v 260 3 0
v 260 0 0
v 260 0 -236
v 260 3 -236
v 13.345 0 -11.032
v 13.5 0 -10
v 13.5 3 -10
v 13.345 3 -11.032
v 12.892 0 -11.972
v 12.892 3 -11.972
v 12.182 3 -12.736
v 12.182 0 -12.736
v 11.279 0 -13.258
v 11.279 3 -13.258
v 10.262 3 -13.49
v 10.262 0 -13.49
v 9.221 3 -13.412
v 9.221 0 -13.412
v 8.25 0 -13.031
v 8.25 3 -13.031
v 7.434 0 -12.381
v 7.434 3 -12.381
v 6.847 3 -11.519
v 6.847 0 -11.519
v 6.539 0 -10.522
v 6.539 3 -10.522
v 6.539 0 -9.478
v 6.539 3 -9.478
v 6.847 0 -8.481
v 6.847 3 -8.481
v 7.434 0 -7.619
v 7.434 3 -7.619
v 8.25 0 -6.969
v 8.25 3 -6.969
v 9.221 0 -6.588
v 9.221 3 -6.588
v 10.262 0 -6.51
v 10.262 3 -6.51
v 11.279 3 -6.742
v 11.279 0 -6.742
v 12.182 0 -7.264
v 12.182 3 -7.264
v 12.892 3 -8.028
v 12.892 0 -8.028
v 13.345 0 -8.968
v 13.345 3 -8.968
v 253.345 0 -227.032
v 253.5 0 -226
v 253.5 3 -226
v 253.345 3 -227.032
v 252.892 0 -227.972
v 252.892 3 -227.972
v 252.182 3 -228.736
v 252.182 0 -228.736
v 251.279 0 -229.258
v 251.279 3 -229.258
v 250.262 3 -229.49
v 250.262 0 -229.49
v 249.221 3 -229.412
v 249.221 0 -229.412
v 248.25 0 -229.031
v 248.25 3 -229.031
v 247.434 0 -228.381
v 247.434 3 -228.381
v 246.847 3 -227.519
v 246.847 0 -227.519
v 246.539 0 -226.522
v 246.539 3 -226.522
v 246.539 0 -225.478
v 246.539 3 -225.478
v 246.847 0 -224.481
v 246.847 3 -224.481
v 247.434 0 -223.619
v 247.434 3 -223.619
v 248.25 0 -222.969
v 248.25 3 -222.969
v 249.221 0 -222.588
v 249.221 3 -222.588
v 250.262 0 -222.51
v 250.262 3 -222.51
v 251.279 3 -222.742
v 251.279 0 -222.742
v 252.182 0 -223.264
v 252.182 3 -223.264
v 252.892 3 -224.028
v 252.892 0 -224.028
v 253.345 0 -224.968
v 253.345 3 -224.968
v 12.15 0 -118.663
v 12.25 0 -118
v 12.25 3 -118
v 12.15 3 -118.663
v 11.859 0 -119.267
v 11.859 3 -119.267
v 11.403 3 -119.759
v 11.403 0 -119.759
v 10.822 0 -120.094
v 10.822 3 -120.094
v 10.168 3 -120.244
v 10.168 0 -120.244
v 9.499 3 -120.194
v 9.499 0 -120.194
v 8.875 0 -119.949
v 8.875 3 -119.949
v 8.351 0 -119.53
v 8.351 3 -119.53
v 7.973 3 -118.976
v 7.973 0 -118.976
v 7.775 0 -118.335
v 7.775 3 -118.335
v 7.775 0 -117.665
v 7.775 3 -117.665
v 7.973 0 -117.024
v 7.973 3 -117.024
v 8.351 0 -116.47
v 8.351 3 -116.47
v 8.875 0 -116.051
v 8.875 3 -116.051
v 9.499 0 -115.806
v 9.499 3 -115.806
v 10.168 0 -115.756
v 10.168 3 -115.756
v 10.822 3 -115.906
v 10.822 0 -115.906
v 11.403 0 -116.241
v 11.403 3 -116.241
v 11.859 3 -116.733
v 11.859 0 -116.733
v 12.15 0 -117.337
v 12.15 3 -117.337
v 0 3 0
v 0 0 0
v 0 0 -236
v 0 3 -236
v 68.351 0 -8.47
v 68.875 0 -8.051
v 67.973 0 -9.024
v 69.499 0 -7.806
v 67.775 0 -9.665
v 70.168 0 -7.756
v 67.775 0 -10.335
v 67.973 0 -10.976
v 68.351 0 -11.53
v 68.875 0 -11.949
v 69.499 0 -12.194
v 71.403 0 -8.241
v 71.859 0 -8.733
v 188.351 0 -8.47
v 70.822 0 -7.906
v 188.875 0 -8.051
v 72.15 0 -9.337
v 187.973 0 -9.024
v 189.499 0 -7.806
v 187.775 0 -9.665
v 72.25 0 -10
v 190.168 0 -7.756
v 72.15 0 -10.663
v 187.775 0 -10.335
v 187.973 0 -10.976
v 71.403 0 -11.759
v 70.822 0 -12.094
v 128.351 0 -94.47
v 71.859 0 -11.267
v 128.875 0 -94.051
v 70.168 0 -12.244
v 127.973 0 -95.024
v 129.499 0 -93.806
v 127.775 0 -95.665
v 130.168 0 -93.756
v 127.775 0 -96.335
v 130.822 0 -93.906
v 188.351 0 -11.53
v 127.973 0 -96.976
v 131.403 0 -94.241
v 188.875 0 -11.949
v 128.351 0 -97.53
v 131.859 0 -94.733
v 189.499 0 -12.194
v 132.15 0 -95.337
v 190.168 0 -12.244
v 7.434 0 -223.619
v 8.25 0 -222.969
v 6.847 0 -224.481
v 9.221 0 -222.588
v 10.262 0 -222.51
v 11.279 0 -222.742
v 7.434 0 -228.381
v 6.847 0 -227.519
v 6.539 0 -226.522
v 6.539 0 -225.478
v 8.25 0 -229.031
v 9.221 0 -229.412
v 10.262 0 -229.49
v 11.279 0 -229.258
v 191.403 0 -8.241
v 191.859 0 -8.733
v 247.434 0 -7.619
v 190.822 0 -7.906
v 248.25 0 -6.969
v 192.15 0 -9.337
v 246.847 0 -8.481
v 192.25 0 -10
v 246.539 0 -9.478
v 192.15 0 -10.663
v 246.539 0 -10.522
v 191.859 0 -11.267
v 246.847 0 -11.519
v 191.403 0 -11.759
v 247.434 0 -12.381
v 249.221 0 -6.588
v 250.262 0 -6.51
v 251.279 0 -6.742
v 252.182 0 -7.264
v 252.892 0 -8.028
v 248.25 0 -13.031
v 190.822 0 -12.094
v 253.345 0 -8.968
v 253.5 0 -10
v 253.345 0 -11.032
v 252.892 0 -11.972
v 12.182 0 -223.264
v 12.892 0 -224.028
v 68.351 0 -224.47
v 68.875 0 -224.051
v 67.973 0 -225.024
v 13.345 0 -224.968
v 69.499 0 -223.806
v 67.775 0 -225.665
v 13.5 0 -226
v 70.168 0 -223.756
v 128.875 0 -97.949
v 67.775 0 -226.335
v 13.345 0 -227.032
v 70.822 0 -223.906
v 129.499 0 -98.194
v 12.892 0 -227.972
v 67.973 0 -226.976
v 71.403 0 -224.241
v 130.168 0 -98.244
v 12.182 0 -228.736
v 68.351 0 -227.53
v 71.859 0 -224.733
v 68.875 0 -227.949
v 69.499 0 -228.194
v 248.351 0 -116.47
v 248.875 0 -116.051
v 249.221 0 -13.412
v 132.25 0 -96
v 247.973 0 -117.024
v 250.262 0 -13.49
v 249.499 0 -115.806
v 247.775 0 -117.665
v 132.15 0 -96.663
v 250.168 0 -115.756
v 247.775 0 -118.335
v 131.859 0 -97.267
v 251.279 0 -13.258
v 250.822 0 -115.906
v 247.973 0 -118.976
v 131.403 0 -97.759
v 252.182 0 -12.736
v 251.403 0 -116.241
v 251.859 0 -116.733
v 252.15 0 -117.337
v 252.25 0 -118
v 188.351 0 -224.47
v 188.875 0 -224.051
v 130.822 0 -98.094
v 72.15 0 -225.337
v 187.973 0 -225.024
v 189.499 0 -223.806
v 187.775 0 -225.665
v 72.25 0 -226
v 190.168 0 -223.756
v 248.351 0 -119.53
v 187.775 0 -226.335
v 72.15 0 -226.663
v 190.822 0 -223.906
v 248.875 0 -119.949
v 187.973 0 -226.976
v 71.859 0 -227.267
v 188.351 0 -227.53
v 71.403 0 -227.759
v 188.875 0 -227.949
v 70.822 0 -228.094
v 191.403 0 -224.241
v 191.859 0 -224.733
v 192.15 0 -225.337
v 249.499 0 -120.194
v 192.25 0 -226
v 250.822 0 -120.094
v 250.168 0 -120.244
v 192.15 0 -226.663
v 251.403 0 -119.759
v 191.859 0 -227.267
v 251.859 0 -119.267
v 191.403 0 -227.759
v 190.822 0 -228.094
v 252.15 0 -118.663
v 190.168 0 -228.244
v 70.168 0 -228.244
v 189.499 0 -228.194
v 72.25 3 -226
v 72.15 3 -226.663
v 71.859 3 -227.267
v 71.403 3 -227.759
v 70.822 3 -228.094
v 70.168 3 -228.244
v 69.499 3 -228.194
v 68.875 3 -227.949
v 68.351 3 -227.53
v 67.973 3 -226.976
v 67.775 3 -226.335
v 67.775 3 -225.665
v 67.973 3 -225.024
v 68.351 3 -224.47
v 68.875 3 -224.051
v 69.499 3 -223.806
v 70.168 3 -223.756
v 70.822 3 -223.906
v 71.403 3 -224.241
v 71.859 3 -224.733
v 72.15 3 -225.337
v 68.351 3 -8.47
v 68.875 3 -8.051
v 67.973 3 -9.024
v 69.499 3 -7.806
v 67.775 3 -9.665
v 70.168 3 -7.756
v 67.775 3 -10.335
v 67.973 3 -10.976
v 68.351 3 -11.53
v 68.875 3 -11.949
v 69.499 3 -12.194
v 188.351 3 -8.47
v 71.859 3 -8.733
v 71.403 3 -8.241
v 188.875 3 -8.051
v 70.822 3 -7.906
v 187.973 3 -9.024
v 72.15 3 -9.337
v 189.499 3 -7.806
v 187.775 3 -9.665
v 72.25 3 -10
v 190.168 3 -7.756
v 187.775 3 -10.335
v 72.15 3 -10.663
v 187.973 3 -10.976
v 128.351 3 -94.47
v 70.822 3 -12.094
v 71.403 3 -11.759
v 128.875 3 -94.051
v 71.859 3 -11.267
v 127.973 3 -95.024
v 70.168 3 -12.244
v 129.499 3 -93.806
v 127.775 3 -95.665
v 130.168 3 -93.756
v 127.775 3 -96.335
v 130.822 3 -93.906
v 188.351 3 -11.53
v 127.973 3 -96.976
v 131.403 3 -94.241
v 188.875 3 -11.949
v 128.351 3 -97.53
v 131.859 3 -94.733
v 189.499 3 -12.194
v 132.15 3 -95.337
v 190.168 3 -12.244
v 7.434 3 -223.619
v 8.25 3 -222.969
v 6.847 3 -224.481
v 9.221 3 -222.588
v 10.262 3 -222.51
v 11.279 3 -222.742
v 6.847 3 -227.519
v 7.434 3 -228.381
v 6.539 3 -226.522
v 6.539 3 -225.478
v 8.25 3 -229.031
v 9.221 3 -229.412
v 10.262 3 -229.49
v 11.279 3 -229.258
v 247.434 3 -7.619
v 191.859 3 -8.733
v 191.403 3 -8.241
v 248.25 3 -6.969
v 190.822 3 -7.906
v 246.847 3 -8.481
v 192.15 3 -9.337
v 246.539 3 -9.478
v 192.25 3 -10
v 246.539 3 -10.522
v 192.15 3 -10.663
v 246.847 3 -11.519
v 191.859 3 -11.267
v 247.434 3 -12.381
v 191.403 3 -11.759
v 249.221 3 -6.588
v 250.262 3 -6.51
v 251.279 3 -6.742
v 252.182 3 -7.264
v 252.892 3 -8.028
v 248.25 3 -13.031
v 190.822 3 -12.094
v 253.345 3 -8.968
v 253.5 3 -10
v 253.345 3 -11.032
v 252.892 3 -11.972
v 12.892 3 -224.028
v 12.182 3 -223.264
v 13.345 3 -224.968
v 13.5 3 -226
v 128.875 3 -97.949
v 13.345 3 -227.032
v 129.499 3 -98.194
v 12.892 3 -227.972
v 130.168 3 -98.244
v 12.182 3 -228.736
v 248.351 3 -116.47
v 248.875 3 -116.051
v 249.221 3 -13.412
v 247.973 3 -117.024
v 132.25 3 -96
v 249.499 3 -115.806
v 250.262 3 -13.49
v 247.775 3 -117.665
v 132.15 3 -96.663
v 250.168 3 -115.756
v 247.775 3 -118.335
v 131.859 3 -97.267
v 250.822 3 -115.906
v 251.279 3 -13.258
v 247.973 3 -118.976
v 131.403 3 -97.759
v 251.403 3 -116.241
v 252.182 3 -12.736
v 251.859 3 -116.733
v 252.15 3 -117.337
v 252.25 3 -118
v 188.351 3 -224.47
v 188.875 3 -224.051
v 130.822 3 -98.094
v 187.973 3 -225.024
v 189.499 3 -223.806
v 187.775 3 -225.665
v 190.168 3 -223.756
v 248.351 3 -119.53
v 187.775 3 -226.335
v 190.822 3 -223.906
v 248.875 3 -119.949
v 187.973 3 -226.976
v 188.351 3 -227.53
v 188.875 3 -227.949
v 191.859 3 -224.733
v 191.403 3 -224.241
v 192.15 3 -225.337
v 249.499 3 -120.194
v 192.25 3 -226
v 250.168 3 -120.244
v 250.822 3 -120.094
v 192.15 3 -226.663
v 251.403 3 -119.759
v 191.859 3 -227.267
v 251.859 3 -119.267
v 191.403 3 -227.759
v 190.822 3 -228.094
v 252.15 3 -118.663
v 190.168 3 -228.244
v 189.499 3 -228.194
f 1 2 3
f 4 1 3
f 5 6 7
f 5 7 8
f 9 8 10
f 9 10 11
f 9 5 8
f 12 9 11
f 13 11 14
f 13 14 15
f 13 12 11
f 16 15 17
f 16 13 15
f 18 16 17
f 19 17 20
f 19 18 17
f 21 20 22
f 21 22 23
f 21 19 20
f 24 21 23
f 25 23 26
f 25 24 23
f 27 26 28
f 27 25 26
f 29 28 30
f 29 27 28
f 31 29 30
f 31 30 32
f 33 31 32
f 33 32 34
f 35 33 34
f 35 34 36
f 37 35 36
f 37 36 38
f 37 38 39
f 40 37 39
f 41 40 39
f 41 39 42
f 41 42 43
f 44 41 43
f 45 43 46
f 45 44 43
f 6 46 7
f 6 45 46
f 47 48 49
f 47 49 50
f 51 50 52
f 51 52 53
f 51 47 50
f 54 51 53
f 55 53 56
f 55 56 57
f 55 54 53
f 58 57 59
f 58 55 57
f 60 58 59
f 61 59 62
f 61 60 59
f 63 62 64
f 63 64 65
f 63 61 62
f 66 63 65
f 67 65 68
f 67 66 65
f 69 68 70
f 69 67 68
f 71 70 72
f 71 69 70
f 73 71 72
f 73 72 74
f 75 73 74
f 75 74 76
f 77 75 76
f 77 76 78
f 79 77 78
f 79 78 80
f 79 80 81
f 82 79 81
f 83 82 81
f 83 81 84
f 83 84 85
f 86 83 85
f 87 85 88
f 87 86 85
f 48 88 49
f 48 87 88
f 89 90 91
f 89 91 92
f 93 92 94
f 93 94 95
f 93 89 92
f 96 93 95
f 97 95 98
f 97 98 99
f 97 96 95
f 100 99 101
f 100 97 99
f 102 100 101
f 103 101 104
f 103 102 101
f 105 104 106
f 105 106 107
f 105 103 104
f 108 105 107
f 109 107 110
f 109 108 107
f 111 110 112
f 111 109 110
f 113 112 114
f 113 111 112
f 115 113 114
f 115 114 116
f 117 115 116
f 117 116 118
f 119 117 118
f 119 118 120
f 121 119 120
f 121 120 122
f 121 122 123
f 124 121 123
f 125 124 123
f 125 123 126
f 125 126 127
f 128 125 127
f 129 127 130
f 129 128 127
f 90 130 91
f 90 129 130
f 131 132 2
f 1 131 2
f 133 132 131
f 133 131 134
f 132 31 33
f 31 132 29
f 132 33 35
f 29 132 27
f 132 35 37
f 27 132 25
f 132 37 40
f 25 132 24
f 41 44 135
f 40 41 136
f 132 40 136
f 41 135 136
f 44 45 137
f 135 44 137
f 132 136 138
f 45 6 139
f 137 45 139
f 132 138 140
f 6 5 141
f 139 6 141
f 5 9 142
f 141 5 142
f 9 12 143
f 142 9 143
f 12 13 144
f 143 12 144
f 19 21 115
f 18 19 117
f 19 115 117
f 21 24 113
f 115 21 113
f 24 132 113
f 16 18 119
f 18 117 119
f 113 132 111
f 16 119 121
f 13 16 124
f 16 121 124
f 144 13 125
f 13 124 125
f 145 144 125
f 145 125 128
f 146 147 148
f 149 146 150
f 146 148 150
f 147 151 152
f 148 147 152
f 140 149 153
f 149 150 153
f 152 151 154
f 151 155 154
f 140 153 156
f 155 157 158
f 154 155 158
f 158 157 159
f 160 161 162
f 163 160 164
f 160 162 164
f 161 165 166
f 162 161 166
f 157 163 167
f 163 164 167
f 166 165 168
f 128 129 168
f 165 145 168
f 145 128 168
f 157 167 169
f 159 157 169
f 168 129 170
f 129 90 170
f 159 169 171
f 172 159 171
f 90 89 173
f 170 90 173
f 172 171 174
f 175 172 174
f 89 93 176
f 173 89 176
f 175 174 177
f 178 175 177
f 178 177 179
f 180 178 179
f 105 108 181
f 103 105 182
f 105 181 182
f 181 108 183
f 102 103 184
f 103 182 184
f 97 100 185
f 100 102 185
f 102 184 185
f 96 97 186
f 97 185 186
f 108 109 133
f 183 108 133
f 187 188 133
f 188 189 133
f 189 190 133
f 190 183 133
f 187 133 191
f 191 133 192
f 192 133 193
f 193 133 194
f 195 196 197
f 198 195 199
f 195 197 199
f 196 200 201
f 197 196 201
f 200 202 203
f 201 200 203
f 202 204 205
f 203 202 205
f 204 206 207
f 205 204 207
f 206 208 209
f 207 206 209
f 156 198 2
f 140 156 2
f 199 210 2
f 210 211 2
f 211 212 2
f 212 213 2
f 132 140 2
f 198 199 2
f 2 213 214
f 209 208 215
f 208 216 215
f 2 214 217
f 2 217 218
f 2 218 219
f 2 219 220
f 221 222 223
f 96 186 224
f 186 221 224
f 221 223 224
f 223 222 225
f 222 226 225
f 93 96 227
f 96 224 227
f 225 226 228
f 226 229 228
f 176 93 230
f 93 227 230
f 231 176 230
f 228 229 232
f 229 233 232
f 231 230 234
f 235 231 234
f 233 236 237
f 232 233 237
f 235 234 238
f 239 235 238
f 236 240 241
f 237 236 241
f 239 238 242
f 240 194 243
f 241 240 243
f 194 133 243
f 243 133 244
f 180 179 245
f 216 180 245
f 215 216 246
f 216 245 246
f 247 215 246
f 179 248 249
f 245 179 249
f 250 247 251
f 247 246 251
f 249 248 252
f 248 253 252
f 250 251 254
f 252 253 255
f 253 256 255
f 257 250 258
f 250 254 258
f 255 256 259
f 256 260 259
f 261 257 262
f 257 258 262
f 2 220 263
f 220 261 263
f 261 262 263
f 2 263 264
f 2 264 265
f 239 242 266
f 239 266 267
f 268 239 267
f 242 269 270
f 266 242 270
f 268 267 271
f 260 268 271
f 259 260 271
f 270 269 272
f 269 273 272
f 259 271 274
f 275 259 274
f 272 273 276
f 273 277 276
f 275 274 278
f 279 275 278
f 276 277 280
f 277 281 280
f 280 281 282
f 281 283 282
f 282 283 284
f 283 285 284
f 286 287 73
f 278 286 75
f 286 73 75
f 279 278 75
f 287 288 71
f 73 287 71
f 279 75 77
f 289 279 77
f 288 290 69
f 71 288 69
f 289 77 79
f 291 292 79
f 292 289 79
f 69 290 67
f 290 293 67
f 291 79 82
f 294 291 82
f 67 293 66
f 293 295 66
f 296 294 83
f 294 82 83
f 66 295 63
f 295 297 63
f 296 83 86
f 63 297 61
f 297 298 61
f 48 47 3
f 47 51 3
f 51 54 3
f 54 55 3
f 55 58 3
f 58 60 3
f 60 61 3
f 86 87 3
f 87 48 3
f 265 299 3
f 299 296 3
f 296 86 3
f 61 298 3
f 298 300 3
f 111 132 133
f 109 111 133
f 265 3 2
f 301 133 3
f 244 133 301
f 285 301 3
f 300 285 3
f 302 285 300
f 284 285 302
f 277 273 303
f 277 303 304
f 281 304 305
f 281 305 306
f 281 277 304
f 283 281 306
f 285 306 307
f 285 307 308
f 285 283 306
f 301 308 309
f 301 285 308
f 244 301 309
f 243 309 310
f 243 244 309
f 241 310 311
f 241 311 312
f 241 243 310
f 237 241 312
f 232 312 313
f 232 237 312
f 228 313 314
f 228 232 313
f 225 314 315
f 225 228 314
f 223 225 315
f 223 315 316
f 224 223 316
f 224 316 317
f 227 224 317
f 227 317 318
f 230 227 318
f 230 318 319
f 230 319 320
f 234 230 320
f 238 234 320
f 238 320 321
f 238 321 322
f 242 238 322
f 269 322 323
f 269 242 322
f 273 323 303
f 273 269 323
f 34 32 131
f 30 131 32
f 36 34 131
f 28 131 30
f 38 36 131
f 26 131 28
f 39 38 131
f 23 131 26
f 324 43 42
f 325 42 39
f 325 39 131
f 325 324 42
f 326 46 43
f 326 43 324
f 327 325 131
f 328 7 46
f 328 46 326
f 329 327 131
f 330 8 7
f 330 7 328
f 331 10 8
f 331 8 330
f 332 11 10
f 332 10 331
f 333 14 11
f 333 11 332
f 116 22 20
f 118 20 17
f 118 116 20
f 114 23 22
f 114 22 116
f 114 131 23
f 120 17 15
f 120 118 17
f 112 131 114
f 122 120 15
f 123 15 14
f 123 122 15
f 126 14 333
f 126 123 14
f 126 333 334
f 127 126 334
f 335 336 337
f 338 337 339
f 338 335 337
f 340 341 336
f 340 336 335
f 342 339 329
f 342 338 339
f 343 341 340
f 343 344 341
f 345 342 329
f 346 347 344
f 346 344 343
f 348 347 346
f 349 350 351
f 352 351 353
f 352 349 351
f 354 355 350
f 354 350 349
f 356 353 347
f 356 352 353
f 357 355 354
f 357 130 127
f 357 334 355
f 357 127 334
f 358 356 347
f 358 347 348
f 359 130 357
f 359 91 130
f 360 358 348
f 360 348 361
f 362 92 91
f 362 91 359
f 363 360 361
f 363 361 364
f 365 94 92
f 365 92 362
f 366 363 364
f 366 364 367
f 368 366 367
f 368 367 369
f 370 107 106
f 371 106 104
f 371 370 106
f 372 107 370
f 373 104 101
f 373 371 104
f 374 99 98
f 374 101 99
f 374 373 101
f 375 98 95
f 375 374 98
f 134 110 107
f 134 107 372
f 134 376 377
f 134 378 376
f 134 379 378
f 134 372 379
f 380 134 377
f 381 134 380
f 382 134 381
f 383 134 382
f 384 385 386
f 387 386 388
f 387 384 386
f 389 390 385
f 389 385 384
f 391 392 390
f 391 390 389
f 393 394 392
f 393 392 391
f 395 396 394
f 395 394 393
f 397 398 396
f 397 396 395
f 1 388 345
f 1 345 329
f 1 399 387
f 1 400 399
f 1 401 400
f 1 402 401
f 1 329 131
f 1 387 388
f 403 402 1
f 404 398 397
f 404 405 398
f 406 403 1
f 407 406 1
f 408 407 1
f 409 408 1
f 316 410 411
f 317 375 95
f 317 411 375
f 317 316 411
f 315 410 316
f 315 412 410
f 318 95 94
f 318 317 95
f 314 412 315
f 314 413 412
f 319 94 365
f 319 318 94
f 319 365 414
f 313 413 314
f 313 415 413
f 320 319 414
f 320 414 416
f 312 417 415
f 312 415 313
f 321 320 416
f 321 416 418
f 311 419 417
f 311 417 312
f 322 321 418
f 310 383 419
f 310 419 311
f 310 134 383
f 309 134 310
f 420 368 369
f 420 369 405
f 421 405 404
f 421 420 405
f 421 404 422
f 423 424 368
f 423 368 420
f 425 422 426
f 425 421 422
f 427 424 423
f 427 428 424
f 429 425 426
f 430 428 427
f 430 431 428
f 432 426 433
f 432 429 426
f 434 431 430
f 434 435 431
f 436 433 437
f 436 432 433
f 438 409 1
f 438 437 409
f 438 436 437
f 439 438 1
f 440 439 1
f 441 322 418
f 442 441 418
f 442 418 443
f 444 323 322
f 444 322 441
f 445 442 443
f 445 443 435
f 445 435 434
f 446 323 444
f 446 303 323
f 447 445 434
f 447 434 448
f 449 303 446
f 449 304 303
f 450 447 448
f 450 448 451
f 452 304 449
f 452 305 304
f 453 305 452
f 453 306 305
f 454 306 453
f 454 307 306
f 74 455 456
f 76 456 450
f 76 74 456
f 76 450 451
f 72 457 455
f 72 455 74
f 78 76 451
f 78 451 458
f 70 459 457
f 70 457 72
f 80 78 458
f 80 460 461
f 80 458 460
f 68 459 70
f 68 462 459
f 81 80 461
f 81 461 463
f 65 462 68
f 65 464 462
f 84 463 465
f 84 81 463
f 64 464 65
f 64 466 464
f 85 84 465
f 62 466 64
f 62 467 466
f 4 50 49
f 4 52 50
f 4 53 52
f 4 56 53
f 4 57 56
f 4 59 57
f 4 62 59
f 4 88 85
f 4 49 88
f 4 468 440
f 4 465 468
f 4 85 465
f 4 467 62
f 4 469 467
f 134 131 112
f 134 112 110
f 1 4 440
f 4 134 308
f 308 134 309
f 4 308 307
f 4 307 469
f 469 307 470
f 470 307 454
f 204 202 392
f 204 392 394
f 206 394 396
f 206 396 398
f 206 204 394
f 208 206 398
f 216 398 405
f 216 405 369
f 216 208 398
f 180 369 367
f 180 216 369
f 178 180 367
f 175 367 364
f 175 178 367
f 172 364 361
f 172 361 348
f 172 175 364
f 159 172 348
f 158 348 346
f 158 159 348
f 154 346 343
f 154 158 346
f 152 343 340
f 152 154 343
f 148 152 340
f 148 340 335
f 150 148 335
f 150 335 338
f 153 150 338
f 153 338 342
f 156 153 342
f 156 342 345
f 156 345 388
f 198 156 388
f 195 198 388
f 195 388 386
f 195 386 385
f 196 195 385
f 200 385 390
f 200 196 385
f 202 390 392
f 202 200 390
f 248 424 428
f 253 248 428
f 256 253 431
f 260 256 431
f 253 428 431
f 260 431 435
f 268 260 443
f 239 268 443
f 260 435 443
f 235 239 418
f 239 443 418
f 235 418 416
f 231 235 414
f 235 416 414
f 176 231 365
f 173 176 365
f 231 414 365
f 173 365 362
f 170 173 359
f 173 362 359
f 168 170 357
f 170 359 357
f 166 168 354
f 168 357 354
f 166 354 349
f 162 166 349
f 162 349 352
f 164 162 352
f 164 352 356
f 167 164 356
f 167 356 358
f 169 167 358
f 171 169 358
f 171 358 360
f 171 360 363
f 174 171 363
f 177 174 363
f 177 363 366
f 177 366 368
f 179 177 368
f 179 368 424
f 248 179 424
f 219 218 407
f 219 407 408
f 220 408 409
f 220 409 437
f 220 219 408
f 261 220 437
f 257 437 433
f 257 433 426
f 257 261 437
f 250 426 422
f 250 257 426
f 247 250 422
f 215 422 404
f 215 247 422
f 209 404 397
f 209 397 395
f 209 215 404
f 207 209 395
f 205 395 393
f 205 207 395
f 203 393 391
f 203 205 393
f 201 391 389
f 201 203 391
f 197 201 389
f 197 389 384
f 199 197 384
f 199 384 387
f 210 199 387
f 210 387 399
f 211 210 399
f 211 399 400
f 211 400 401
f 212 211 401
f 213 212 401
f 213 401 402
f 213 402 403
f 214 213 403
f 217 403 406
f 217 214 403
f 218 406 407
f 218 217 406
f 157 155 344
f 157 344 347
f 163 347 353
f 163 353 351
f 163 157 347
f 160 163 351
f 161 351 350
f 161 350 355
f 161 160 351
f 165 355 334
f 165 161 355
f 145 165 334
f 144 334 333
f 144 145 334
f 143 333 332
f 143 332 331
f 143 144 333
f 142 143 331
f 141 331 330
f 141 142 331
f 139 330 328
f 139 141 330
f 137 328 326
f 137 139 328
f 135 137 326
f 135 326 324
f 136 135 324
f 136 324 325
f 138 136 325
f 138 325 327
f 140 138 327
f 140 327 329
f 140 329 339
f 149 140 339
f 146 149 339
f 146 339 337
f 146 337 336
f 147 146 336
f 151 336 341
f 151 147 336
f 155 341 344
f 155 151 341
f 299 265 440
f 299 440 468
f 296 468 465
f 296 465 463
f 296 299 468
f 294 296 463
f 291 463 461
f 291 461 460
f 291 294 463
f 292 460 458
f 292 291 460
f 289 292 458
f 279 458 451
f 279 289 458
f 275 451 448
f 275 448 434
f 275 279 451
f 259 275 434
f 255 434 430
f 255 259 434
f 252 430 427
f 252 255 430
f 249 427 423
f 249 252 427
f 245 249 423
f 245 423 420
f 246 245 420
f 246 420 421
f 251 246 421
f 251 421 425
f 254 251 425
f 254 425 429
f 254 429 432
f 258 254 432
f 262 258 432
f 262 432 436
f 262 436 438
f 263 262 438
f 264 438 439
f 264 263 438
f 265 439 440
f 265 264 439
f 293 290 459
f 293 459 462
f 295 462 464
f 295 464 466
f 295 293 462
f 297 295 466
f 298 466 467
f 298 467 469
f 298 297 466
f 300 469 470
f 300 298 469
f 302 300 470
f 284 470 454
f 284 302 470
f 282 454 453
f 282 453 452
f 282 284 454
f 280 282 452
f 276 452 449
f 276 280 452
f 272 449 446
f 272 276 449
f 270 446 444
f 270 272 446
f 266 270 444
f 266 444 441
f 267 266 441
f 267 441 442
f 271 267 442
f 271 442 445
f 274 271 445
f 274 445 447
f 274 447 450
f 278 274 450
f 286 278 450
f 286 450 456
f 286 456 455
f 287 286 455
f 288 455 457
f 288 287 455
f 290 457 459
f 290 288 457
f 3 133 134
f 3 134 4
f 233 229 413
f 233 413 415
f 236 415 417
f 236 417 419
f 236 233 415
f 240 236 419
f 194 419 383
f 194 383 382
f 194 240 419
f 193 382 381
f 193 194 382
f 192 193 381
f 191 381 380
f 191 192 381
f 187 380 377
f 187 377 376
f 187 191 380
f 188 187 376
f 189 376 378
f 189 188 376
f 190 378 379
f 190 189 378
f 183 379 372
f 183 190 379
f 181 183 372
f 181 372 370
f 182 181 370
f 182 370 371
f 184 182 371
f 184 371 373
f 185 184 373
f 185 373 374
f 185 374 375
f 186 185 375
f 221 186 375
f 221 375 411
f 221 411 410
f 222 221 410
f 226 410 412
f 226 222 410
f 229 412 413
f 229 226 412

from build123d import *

# Parameters (mm, degrees)
SKETCH_1_W         = 260
SKETCH_1_H         = 236
SKETCH_1_R         = 2.25
SKETCH_1_R_2       = 3.5
EXTRUDE_1_DEPTH    = 3
SKETCH1_R          = 2.25
CUT_EXTRUDE1_DEPTH = 4


with BuildPart() as part:
    # Эскиз1 → Бобышка-Вытянуть1 (new body)
    with BuildSketch(Plane(origin=(0, 0, 0), x_dir=(1, 0, 0), z_dir=(0, 1, 0))):
        with Locations((130, 118)):
            Rectangle(SKETCH_1_W, SKETCH_1_H)
        with Locations((10, 118)):
            Circle(SKETCH_1_R, mode=Mode.SUBTRACT)
        with Locations((250, 118)):
            Circle(SKETCH_1_R, mode=Mode.SUBTRACT)
        with Locations((70, 226)):
            Circle(SKETCH_1_R, mode=Mode.SUBTRACT)
        with Locations((190, 226)):
            Circle(SKETCH_1_R, mode=Mode.SUBTRACT)
        with Locations((70, 10)):
            Circle(SKETCH_1_R, mode=Mode.SUBTRACT)
        with Locations((190, 10)):
            Circle(SKETCH_1_R, mode=Mode.SUBTRACT)
        with Locations((10, 226)):
            Circle(SKETCH_1_R_2, mode=Mode.SUBTRACT)
        with Locations((250, 226)):
            Circle(SKETCH_1_R_2, mode=Mode.SUBTRACT)
        with Locations((250, 10)):
            Circle(SKETCH_1_R_2, mode=Mode.SUBTRACT)
        with Locations((10, 10)):
            Circle(SKETCH_1_R_2, mode=Mode.SUBTRACT)
    extrude(amount=EXTRUDE_1_DEPTH)

    # Sketch1 → Cut-Extrude1 (cut, through all)
    with BuildSketch(Plane(origin=(0, 3, 0), x_dir=(1, 0, 0), z_dir=(0, 1, 0))):
        with Locations((130, 96)):
            Circle(SKETCH1_R)
    extrude(amount=-CUT_EXTRUDE1_DEPTH, mode=Mode.SUBTRACT)


solid = part.part
